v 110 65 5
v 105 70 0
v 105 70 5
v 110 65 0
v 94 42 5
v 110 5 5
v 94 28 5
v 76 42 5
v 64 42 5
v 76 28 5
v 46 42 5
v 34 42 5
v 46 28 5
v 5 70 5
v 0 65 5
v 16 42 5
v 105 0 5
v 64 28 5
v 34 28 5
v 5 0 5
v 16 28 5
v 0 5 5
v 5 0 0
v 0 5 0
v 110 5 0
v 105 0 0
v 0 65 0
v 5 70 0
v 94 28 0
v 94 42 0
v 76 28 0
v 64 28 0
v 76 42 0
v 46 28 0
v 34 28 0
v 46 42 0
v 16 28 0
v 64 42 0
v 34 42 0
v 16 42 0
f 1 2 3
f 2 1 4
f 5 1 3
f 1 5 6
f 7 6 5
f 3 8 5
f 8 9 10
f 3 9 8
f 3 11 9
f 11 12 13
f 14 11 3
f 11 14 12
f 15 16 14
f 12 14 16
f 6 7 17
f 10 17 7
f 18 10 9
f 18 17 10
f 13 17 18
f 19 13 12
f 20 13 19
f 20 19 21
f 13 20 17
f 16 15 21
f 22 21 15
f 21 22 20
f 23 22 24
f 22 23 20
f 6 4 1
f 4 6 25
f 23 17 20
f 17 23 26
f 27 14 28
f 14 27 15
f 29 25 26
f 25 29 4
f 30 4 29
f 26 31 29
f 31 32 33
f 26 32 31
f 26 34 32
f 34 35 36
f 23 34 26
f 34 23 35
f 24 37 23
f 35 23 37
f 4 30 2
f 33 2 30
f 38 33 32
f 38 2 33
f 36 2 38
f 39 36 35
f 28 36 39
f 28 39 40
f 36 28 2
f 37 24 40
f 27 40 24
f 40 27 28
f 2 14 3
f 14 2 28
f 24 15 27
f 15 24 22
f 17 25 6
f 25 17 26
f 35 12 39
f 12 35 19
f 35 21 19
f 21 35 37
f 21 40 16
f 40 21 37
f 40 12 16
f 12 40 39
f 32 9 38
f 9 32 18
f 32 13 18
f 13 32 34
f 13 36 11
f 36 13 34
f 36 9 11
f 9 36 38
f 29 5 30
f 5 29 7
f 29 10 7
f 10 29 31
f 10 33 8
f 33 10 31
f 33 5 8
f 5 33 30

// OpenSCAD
$fn = 32;

// ----------------------------------------------------------------------
// Windowed plate: 3 voids, 110 x 70 x 5 mm
// ----------------------------------------------------------------------

// --- parameters (mm) ---
plate_l = 110;            // plate length, X
plate_w = 70;             // plate width, Y
plate_t = 5;              // plate thickness, Z
edge_margin = 10;         // wall from the plate edge to any window
windows = 3;              // number of windows in the row
win_l = 18;               // window length
win_w = 14;               // window width
win_pitch = 30;           // window pitch along X
depth_1 = 5;              // depth of void 1 (full thickness = through)
depth_2 = 5;              // depth of void 2 (full thickness = through)
depth_3 = 5;              // depth of void 3 (full thickness = through)
corner_c = 5;             // corner chamfer of the plate

profile = [[5, 0], [105, 0], [110, 5], [110, 65], [105, 70], [5, 70], [0, 65], [0, 5]];  // primary outline, 8 points, counter clockwise
void_1 = [[16, 28], [34, 28], [34, 42], [16, 42]];  // window 1 of the row, 4 points
void_2 = [[46, 28], [64, 28], [64, 42], [46, 42]];  // window 2 of the row, 4 points
void_3 = [[76, 28], [94, 28], [94, 42], [76, 42]];  // window 3 of the row, 4 points

// --- the one profile operation ---
difference() {
  linear_extrude(height = plate_t) polygon(points = profile);
  translate([0, 0, -1])
    linear_extrude(height = plate_t + 2) polygon(points = void_1);
  translate([0, 0, -1])
    linear_extrude(height = plate_t + 2) polygon(points = void_2);
  translate([0, 0, -1])
    linear_extrude(height = plate_t + 2) polygon(points = void_3);
}
